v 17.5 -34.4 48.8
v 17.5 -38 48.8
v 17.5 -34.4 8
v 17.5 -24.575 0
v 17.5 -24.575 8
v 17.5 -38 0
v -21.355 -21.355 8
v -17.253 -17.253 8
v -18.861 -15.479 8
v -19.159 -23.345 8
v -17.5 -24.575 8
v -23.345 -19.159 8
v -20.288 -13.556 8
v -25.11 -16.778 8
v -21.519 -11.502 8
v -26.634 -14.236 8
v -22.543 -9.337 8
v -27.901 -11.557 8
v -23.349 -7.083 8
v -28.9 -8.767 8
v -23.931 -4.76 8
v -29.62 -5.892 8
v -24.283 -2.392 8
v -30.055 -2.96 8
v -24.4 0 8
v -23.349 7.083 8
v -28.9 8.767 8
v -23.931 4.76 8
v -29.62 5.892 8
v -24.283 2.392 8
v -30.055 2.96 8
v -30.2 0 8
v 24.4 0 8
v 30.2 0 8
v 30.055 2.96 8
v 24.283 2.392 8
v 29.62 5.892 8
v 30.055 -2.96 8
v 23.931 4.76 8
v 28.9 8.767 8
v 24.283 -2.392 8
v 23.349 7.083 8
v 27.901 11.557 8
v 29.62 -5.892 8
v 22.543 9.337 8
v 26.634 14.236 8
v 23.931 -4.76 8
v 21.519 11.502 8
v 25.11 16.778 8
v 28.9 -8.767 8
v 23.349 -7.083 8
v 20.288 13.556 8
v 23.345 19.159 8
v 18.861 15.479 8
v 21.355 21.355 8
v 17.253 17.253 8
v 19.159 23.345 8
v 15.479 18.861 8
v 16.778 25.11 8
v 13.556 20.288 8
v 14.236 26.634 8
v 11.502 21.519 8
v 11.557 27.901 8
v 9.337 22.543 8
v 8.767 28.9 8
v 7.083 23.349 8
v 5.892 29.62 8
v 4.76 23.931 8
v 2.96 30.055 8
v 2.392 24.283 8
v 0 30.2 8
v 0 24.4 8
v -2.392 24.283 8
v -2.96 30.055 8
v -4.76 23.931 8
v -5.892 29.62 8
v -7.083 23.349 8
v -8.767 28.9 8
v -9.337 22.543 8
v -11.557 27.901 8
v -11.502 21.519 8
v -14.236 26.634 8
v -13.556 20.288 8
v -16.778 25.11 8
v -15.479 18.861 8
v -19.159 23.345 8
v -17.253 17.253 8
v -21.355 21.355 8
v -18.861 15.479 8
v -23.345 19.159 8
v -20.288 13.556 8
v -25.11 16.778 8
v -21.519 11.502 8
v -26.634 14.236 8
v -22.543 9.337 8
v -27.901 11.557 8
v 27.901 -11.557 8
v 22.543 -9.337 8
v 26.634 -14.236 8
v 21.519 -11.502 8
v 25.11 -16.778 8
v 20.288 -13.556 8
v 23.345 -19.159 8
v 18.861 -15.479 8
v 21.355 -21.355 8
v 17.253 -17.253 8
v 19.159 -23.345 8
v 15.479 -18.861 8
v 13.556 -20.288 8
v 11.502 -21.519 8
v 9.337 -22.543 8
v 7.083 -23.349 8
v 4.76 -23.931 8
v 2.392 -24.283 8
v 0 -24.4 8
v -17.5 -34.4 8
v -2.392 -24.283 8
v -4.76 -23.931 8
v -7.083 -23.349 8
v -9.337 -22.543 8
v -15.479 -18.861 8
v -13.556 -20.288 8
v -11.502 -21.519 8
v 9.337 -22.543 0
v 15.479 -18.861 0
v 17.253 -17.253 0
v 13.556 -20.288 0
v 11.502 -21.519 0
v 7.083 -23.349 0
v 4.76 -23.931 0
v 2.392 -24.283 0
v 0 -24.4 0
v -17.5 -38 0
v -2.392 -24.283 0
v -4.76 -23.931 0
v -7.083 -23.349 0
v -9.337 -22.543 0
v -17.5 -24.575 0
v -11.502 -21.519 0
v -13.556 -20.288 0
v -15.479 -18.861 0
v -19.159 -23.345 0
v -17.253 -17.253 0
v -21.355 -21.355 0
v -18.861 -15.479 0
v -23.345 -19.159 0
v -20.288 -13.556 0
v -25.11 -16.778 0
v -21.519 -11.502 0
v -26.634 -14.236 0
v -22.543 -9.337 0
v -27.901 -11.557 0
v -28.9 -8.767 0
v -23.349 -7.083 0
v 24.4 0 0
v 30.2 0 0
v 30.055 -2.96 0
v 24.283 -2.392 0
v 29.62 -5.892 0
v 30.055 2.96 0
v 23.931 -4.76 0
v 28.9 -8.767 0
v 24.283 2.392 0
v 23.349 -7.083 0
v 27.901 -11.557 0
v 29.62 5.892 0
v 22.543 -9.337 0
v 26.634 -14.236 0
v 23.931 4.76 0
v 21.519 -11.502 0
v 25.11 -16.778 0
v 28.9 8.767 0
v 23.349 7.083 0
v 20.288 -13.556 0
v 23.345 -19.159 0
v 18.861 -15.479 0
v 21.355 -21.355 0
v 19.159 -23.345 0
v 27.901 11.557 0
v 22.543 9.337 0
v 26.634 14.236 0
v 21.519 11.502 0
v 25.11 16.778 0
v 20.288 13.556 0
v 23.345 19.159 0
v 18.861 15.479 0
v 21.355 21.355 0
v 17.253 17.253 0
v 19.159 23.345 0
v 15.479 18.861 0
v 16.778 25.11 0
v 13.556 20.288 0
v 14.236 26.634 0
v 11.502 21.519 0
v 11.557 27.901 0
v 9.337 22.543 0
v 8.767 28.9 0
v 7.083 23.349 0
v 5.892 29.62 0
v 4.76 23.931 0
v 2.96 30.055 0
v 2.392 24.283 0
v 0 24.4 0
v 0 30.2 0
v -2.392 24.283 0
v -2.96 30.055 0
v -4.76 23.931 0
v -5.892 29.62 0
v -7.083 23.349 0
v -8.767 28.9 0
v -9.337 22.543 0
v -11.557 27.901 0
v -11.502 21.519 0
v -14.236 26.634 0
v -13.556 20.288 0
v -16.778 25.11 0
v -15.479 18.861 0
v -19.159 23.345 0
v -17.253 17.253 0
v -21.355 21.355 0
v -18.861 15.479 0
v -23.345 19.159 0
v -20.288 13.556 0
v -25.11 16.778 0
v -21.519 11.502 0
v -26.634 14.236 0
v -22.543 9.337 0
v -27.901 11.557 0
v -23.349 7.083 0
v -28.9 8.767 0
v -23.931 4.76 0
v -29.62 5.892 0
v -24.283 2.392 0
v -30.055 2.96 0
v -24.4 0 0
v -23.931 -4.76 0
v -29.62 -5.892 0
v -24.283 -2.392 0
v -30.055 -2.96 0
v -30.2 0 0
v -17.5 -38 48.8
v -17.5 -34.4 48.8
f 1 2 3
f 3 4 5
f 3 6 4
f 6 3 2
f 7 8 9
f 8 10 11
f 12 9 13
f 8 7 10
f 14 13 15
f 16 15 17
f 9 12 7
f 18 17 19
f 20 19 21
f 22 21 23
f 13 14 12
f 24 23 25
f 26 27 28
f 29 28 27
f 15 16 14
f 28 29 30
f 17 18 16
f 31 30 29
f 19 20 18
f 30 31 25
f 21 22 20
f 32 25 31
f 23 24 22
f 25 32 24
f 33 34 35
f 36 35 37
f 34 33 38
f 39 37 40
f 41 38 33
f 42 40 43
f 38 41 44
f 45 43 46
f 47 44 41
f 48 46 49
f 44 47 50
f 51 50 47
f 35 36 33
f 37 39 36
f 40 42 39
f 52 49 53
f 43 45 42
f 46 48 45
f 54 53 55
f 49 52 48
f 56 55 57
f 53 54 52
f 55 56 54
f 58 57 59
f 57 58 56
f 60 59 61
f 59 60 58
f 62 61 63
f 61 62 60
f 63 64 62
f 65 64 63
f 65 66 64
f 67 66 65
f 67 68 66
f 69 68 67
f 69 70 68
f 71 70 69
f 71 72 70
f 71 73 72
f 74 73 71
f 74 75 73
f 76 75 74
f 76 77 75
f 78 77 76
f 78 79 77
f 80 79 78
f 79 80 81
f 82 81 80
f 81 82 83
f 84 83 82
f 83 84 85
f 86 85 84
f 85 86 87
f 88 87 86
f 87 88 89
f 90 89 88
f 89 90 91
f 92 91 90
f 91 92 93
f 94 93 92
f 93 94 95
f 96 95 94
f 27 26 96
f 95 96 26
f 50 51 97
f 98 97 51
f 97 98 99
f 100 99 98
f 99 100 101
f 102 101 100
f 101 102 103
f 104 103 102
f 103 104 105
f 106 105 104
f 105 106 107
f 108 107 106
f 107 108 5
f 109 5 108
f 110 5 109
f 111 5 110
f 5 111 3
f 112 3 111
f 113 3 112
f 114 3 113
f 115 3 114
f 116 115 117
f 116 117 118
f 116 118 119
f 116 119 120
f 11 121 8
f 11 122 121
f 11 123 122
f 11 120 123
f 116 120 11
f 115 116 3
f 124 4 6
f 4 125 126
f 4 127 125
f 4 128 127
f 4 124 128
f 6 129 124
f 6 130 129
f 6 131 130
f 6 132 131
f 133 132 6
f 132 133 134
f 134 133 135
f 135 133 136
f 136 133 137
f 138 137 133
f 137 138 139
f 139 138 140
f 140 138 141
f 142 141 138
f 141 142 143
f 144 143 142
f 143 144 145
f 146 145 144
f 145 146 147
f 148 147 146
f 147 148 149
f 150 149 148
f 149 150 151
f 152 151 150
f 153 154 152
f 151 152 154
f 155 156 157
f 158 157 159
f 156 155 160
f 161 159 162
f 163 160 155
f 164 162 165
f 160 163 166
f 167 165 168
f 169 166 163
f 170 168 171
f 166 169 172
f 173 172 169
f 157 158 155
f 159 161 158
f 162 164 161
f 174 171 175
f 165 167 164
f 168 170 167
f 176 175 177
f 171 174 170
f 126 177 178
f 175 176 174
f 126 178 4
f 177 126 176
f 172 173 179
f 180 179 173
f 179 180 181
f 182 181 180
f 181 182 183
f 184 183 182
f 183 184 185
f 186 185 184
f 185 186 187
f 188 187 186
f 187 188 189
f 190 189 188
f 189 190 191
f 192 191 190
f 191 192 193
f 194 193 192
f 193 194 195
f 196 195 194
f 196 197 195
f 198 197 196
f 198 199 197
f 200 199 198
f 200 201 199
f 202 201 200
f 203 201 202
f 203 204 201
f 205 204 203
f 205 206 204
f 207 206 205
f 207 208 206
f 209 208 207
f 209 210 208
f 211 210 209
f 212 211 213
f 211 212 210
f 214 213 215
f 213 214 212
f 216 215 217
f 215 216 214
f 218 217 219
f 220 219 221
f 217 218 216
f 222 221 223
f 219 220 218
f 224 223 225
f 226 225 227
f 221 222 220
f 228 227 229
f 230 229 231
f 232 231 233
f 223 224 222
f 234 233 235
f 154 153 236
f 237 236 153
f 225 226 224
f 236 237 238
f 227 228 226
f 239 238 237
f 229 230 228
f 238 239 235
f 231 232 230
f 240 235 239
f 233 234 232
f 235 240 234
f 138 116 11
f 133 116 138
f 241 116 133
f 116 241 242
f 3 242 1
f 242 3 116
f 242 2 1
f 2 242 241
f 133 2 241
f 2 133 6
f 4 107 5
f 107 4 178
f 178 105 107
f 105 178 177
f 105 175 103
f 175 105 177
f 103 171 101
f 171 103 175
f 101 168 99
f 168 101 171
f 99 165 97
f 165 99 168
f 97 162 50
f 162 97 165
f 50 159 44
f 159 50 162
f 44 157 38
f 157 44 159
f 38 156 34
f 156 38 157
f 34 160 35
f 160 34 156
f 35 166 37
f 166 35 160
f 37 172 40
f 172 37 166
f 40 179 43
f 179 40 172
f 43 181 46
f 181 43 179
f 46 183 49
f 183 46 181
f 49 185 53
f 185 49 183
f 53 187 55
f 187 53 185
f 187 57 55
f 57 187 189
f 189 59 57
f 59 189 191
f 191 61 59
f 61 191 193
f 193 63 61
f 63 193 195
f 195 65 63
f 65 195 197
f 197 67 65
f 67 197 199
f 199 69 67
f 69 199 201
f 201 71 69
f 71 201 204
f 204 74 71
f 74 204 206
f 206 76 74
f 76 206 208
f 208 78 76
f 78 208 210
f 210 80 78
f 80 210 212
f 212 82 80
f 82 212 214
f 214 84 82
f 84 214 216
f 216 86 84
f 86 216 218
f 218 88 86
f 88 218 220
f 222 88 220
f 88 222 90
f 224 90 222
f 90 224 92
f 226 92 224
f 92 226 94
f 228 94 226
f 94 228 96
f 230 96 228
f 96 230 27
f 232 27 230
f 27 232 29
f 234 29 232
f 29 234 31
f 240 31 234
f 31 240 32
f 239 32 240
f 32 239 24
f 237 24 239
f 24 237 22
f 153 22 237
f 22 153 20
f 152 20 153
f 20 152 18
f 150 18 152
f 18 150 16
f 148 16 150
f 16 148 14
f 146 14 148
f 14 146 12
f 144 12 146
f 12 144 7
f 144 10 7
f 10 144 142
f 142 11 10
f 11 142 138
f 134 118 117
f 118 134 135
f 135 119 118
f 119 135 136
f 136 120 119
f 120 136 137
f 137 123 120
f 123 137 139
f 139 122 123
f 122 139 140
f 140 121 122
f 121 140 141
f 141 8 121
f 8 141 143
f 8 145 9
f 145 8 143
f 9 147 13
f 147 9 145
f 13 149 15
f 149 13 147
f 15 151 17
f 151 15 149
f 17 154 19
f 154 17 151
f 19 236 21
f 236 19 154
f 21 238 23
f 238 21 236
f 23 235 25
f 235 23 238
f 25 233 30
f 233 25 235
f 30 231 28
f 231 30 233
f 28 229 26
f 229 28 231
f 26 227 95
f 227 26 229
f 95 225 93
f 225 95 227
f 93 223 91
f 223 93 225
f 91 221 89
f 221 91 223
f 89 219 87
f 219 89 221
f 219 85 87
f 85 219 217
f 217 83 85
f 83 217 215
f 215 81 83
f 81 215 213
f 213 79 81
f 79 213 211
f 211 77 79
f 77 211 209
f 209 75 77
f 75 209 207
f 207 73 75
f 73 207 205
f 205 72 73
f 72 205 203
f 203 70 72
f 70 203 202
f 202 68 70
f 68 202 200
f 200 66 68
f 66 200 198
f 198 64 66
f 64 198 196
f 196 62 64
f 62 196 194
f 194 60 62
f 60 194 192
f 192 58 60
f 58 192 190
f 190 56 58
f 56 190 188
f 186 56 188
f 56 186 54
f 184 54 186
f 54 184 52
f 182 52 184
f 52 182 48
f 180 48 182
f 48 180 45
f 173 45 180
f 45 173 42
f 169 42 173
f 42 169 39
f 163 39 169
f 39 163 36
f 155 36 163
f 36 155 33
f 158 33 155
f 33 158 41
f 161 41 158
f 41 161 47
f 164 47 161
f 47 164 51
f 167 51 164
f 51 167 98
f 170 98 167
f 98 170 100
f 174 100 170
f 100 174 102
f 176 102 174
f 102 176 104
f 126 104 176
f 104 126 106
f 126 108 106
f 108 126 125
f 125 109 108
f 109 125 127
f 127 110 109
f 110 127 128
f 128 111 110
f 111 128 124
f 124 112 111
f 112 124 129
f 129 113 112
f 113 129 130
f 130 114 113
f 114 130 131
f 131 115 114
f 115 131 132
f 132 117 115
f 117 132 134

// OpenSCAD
difference()
{

    linear_extrude(height = 8)
    difference() {
        circle(30.2, $fn=64);//60.4 mm
        circle(24.4, $fn=64);//48.4 mm + 0,2 Toleranz = 48.8
    }
    
    //translate([-4,24,0])
    //cube([8,8,8]);
}



translate([-17.5,-34.4,0]) //[Hälfte der Grundplatte, -24.4-10, 0)
{    
    cube([35,10,8]); //35 (gerade so breit, dass es bündig mit dem Kreis ist), 11 ist die reine Standfläche, 8 = so hoch wie der Kreis
    
    translate([0,-3.6,0])
    cube([35,3.6,48.8]); //48 = ~Hälfte vom S7 (40) + 8 von der Basisplatte => nehmen wir 48.4 dann haben wir exakt den Durchmesser vom inneren Kreis, -3.6 translate => Wände außerhalb, damit wir unsere volle Standfläche von 11 bekommen
}
